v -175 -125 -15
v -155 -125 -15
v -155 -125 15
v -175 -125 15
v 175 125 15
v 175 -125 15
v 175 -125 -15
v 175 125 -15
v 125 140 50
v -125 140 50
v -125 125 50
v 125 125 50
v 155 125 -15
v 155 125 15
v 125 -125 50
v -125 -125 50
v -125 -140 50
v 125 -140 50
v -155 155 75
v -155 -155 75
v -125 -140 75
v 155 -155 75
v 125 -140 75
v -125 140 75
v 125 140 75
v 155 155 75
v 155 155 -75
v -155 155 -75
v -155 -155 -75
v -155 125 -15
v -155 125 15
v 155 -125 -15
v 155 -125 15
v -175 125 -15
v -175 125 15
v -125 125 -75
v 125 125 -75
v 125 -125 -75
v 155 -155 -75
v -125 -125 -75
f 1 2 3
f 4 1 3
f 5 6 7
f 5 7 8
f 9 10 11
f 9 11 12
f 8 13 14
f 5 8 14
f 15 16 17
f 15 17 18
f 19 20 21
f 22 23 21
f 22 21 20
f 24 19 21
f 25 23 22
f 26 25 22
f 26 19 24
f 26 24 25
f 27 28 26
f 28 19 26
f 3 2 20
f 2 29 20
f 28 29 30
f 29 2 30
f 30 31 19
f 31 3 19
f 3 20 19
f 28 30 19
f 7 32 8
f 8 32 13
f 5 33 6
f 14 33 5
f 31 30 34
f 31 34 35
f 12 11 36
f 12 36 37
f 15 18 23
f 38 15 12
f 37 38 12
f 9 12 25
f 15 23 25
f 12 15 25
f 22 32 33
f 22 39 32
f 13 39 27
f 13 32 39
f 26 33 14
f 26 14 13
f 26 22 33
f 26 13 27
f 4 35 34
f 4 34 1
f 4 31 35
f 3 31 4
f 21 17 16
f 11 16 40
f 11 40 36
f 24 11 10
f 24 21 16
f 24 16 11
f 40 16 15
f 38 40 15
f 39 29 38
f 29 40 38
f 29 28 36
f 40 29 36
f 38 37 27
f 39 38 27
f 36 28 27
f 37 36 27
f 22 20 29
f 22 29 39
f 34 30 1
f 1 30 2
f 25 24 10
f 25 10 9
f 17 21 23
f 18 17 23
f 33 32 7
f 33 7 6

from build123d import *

# Parameters (mm, degrees)
F0_W     = 310
F0_H     = 310
F0_W_2   = 250
F0_H_2   = 250
F1_DEPTH = 75
F3_W     = 250
F3_H     = 280
F4_DEPTH = 25
F5_W     = 250
F5_H     = 30
F6_DEPTH = 20
F7_W     = 250
F7_H     = 30
F8_DEPTH = 20


with BuildPart() as f1:
    # F0 (on Top) → F1 (new body, symmetric)
    with BuildSketch(Plane.XY):
        Rectangle(F0_W, F0_H)
        Rectangle(F0_W_2, F0_H_2, mode=Mode.SUBTRACT)
    extrude(amount=F1_DEPTH, both=True)

    # F3 (on offset) → F4 (cut)
    with BuildSketch(Plane.XY.offset(75)):
        Rectangle(F3_W, F3_H)
    extrude(amount=-F4_DEPTH, mode=Mode.SUBTRACT)

    # F5 (on face) → F6 (join)
    with BuildSketch(Plane(origin=(-155, 0, 0), x_dir=(0, -1, 0), z_dir=(-1, 0, 0))):
        Rectangle(F5_W, F5_H)
    extrude(amount=F6_DEPTH)

    # F7 (on face) → F8 (join)
    with BuildSketch(Plane.YZ.offset(155)):
        Rectangle(F7_W, F7_H)
    extrude(amount=F8_DEPTH)


solid = f1.part
